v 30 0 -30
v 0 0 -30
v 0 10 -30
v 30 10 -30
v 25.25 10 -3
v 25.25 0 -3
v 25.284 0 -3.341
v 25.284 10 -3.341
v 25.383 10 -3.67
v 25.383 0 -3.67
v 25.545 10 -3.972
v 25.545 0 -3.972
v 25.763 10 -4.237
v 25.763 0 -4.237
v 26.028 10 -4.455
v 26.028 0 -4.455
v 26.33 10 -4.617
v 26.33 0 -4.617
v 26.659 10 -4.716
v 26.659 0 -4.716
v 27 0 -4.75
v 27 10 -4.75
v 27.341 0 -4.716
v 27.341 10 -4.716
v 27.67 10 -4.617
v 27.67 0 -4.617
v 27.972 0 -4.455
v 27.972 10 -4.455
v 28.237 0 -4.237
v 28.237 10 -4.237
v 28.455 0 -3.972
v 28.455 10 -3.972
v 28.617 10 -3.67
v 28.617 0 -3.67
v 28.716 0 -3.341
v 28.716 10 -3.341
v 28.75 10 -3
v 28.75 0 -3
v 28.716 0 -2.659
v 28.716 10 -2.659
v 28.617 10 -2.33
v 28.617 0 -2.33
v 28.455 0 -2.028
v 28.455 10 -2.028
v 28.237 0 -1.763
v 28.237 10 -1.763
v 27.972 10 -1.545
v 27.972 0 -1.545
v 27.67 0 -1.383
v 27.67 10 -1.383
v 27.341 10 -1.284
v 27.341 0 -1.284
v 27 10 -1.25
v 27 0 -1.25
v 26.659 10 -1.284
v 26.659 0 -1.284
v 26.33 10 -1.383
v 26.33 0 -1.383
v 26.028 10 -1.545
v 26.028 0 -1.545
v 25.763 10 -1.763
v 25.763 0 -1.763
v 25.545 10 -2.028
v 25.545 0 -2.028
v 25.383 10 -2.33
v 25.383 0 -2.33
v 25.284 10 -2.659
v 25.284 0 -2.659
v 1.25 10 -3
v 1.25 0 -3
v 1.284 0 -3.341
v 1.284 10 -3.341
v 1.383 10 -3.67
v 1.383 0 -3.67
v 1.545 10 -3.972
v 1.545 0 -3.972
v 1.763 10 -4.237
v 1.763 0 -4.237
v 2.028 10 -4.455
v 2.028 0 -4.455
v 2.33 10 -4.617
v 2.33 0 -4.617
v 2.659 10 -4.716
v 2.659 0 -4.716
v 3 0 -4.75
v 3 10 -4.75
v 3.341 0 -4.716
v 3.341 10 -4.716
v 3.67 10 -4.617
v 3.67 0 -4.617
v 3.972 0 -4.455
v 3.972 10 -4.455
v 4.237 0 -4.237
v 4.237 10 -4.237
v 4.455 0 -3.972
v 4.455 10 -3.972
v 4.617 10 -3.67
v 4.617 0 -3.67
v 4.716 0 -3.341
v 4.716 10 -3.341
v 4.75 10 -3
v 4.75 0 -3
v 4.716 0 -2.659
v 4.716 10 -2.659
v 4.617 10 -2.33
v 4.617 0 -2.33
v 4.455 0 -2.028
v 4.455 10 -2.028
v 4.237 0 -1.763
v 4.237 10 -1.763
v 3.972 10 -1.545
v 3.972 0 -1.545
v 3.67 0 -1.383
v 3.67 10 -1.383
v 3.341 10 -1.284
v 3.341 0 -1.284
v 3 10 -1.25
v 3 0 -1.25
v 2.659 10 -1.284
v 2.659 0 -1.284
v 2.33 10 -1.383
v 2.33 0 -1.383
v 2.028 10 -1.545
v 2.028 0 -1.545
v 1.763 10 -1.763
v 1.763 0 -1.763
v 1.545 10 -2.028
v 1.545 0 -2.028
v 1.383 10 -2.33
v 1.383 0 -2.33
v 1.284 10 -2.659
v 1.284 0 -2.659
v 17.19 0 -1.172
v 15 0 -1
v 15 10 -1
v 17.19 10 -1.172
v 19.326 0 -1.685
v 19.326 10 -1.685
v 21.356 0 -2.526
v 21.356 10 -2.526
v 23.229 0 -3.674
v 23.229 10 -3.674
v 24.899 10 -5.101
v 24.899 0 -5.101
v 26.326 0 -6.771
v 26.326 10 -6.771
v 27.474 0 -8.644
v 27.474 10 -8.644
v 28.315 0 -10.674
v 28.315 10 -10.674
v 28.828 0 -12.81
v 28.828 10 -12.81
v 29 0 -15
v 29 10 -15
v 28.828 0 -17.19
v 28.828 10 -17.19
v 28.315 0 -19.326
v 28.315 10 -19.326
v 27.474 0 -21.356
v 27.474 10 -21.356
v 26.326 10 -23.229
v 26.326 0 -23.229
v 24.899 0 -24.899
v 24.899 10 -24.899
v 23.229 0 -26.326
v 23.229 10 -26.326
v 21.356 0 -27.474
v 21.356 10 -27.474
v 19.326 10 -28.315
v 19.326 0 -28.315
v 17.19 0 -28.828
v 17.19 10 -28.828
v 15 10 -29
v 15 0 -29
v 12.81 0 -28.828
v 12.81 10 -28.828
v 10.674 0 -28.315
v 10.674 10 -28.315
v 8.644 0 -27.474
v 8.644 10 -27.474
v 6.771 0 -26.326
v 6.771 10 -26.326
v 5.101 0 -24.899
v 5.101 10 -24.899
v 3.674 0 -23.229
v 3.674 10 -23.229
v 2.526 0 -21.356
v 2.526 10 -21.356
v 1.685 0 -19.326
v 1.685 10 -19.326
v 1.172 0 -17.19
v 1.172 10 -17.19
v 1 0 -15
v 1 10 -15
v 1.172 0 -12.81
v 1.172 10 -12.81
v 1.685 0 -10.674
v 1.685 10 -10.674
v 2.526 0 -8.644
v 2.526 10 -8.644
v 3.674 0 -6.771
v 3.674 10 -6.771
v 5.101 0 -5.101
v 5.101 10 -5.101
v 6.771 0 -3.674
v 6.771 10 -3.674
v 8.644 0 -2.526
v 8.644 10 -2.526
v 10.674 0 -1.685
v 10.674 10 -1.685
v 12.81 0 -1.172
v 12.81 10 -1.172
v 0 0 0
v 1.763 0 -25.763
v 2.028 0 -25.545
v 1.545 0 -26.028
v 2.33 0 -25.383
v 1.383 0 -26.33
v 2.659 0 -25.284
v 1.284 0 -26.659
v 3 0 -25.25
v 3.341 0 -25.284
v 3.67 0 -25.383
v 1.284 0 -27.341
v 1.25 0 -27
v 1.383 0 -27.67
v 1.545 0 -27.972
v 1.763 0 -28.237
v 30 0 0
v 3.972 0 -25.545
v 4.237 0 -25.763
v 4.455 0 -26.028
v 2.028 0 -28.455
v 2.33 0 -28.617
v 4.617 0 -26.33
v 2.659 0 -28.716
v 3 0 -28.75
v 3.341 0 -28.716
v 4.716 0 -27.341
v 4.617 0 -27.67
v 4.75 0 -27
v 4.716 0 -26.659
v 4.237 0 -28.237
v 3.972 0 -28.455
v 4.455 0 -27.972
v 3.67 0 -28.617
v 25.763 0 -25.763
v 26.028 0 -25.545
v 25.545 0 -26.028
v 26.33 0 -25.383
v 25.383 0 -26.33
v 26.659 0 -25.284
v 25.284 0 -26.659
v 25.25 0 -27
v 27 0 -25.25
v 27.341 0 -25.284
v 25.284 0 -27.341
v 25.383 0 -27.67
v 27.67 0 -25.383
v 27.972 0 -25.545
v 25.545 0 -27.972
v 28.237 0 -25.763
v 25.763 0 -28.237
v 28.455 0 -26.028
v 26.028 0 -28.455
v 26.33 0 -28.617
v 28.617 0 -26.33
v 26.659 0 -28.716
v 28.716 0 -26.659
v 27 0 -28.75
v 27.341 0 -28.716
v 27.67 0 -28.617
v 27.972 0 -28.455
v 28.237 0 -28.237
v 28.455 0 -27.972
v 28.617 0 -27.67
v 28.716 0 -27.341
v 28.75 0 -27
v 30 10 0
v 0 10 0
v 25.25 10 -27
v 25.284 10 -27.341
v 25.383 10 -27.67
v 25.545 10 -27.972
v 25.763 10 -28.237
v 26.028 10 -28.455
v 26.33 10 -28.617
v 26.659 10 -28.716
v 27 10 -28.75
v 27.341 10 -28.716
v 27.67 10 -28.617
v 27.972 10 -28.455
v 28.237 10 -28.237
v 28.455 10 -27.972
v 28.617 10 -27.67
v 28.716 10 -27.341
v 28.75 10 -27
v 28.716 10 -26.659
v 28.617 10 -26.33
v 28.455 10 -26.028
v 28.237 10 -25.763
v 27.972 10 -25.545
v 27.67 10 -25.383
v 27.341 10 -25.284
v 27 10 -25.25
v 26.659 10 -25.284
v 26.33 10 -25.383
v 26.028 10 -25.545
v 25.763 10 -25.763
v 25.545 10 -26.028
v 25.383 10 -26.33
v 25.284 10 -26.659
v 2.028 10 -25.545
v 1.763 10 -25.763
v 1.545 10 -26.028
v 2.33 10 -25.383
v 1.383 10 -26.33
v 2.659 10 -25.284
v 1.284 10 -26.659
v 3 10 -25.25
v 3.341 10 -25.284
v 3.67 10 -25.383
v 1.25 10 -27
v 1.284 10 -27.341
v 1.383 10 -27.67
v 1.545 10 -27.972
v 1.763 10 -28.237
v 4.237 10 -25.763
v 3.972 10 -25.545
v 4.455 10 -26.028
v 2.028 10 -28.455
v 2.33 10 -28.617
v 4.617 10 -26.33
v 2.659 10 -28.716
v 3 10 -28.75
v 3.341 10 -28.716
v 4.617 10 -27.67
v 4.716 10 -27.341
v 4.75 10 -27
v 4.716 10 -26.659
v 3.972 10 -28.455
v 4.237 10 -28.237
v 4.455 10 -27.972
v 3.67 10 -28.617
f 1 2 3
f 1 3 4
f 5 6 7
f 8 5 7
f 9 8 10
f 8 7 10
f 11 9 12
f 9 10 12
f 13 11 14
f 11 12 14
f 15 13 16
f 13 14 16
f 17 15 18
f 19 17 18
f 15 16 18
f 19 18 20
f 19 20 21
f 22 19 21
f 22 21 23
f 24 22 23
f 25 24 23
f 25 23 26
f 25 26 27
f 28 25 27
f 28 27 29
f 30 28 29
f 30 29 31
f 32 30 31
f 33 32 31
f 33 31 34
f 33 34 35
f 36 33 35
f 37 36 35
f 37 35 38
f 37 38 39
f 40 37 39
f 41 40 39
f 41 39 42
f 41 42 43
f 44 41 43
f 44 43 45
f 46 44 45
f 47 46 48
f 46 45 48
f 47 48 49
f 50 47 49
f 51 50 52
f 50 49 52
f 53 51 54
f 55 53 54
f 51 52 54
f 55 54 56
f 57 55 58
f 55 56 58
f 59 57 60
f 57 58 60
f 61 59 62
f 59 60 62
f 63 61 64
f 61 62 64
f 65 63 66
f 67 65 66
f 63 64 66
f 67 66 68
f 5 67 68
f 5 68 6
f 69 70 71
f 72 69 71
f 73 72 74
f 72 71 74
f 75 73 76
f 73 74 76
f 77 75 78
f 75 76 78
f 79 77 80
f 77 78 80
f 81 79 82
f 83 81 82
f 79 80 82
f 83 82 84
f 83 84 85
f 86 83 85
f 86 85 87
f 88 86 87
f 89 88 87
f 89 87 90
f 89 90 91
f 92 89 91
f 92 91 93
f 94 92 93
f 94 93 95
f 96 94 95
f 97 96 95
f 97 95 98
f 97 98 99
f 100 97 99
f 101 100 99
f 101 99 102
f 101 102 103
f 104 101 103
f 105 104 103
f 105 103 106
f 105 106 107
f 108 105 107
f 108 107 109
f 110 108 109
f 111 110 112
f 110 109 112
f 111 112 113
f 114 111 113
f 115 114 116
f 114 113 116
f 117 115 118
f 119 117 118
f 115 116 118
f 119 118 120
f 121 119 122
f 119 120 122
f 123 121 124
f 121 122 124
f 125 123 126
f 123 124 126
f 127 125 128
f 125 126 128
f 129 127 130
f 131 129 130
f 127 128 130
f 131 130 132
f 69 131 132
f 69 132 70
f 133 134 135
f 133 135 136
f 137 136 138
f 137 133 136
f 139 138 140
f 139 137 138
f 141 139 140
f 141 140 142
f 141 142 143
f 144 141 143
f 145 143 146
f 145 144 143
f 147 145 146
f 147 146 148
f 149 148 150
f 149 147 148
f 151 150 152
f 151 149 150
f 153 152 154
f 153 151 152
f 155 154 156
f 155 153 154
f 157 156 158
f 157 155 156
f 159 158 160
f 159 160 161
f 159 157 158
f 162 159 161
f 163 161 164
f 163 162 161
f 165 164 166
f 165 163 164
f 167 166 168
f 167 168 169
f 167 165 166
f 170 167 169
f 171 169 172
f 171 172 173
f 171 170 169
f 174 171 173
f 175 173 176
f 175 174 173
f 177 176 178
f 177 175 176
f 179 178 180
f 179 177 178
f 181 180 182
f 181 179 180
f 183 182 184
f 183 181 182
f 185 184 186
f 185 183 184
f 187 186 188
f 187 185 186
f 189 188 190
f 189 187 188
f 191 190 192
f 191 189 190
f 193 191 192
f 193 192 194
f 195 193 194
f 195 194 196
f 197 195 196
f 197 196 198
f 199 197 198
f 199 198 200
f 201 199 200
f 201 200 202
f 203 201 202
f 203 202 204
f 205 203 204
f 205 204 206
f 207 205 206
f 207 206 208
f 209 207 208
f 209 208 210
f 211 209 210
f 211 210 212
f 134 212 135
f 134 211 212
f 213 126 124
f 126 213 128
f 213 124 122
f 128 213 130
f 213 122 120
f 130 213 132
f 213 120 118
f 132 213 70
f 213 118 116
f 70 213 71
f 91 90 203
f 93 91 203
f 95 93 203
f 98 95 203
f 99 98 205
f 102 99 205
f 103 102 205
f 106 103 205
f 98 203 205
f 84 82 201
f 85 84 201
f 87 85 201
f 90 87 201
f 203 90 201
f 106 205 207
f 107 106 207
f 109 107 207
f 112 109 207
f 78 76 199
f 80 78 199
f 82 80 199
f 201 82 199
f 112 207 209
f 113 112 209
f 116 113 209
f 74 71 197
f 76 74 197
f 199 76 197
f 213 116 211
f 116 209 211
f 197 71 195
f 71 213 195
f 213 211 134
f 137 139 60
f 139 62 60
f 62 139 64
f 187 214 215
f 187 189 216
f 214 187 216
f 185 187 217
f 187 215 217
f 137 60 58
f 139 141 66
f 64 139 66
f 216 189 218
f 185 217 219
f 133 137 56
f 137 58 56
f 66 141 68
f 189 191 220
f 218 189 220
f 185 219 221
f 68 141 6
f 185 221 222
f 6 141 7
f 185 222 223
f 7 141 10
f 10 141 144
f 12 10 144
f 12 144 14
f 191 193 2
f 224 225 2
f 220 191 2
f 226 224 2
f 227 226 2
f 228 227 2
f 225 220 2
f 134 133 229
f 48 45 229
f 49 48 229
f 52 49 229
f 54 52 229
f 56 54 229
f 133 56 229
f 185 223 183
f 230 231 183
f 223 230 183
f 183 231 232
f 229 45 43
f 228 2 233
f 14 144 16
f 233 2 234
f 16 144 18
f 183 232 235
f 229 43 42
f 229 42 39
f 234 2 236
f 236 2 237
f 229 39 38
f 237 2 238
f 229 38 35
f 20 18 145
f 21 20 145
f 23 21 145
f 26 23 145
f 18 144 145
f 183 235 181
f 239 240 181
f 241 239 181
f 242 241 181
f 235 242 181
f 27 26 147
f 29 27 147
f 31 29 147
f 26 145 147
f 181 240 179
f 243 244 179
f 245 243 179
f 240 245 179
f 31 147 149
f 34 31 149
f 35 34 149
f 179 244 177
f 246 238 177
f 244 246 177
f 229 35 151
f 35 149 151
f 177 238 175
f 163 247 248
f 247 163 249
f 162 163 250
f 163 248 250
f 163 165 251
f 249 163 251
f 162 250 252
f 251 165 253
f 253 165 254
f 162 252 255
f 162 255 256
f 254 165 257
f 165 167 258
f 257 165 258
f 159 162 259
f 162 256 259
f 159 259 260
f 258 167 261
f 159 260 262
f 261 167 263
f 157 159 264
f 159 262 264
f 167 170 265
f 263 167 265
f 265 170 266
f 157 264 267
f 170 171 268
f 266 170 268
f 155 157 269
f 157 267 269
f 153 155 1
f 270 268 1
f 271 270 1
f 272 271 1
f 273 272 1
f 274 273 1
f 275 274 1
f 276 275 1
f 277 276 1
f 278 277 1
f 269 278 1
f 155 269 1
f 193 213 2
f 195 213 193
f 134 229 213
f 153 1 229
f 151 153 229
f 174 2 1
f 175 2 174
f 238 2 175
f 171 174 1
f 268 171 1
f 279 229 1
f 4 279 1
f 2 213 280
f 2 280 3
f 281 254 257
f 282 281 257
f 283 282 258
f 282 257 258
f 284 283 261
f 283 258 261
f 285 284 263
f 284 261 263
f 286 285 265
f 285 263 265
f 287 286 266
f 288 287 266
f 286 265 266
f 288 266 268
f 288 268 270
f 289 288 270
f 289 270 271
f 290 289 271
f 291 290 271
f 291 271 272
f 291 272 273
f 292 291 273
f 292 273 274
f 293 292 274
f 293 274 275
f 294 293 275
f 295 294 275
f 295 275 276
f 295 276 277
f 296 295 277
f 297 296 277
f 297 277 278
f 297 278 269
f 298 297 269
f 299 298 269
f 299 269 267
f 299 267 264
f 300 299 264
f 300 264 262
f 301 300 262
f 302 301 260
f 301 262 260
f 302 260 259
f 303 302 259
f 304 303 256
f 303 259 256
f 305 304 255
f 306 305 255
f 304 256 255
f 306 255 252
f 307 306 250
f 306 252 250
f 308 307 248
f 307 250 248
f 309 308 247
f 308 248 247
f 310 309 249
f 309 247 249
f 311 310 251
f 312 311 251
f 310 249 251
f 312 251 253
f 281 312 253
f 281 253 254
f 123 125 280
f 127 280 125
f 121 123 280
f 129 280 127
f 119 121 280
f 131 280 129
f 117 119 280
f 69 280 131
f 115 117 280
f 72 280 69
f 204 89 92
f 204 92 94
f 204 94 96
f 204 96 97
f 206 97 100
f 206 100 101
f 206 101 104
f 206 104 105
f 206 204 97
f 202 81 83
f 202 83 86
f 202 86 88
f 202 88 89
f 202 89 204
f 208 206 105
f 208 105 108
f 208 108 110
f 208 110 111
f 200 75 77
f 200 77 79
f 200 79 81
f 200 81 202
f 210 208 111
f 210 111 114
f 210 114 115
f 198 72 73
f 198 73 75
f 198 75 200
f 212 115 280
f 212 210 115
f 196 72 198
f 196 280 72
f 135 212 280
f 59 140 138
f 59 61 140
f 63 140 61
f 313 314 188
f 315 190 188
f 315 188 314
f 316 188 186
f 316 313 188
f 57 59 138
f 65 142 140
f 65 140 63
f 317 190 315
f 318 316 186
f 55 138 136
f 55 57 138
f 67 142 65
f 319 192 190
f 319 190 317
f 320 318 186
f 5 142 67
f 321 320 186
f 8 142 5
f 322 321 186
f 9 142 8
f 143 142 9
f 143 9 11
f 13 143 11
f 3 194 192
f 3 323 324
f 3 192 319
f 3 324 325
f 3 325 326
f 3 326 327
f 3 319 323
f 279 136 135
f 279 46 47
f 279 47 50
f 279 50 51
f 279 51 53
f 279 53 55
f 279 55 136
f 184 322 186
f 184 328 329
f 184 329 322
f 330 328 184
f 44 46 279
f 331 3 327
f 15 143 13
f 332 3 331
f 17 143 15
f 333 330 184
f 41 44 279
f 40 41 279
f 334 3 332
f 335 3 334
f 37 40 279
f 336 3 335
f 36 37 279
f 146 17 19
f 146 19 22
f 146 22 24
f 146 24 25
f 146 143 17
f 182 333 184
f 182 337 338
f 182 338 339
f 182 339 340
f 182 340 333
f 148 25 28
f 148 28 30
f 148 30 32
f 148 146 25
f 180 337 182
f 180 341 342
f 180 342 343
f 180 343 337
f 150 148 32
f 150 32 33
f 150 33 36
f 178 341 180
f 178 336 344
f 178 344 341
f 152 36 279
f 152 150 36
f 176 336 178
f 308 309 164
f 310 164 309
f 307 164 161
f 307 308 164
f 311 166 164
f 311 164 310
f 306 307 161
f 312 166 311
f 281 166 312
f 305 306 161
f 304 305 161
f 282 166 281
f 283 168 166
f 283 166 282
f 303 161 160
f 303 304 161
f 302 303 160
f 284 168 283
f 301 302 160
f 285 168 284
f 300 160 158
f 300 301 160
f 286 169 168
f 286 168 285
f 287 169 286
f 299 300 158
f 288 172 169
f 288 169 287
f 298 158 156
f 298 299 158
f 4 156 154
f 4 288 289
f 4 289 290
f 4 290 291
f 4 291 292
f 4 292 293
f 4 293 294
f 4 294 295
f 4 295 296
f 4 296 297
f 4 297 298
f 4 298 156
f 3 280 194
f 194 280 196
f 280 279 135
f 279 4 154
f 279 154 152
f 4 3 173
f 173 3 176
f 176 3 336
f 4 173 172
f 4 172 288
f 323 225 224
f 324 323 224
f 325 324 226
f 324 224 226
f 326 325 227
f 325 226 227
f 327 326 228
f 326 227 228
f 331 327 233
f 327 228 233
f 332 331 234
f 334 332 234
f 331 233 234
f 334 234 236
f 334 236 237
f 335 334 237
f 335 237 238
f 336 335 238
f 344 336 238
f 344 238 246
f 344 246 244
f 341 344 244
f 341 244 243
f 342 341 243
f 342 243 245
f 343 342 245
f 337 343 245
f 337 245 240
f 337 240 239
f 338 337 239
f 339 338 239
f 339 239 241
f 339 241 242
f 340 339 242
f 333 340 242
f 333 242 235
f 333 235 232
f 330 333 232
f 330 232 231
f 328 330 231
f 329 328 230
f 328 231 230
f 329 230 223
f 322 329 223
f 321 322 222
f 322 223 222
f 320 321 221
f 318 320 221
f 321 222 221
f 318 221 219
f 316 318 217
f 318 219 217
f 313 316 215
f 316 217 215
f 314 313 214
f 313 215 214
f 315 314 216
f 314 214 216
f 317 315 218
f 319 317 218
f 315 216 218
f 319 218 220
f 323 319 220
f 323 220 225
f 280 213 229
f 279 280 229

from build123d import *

# Parameters (mm, degrees)
SKETCH_1_W              = 30
SKETCH_1_H              = 30
SKETCH_1_R              = 14
EXTRUDE_1_DEPTH         = 10
HOLE_WIZARD_3_5_3_5_1_D = 3.5


with BuildPart() as part:
    # Эскиз1 → Бобышка-Вытянуть1 (new body)
    with BuildSketch(Plane(origin=(0, 0, 0), x_dir=(1, 0, 0), z_dir=(0, 1, 0))):
        with Locations((15, 15)):
            Rectangle(SKETCH_1_W, SKETCH_1_H)
        with Locations(Location((15, 15, 0), (0, 0, 270))):
            Circle(SKETCH_1_R, mode=Mode.SUBTRACT)
    extrude(amount=EXTRUDE_1_DEPTH)

    # Диаметр отверстия Ø3.5 (3.5)1 (through all)
    with Locations(Plane(origin=(0, 10, 0), x_dir=(1, 0, 0), z_dir=(0, 1, 0))):
        with Locations((3, 27), (27, 27), (27, 3), (3, 3)):
            Hole(HOLE_WIZARD_3_5_3_5_1_D / 2)


solid = part.part
